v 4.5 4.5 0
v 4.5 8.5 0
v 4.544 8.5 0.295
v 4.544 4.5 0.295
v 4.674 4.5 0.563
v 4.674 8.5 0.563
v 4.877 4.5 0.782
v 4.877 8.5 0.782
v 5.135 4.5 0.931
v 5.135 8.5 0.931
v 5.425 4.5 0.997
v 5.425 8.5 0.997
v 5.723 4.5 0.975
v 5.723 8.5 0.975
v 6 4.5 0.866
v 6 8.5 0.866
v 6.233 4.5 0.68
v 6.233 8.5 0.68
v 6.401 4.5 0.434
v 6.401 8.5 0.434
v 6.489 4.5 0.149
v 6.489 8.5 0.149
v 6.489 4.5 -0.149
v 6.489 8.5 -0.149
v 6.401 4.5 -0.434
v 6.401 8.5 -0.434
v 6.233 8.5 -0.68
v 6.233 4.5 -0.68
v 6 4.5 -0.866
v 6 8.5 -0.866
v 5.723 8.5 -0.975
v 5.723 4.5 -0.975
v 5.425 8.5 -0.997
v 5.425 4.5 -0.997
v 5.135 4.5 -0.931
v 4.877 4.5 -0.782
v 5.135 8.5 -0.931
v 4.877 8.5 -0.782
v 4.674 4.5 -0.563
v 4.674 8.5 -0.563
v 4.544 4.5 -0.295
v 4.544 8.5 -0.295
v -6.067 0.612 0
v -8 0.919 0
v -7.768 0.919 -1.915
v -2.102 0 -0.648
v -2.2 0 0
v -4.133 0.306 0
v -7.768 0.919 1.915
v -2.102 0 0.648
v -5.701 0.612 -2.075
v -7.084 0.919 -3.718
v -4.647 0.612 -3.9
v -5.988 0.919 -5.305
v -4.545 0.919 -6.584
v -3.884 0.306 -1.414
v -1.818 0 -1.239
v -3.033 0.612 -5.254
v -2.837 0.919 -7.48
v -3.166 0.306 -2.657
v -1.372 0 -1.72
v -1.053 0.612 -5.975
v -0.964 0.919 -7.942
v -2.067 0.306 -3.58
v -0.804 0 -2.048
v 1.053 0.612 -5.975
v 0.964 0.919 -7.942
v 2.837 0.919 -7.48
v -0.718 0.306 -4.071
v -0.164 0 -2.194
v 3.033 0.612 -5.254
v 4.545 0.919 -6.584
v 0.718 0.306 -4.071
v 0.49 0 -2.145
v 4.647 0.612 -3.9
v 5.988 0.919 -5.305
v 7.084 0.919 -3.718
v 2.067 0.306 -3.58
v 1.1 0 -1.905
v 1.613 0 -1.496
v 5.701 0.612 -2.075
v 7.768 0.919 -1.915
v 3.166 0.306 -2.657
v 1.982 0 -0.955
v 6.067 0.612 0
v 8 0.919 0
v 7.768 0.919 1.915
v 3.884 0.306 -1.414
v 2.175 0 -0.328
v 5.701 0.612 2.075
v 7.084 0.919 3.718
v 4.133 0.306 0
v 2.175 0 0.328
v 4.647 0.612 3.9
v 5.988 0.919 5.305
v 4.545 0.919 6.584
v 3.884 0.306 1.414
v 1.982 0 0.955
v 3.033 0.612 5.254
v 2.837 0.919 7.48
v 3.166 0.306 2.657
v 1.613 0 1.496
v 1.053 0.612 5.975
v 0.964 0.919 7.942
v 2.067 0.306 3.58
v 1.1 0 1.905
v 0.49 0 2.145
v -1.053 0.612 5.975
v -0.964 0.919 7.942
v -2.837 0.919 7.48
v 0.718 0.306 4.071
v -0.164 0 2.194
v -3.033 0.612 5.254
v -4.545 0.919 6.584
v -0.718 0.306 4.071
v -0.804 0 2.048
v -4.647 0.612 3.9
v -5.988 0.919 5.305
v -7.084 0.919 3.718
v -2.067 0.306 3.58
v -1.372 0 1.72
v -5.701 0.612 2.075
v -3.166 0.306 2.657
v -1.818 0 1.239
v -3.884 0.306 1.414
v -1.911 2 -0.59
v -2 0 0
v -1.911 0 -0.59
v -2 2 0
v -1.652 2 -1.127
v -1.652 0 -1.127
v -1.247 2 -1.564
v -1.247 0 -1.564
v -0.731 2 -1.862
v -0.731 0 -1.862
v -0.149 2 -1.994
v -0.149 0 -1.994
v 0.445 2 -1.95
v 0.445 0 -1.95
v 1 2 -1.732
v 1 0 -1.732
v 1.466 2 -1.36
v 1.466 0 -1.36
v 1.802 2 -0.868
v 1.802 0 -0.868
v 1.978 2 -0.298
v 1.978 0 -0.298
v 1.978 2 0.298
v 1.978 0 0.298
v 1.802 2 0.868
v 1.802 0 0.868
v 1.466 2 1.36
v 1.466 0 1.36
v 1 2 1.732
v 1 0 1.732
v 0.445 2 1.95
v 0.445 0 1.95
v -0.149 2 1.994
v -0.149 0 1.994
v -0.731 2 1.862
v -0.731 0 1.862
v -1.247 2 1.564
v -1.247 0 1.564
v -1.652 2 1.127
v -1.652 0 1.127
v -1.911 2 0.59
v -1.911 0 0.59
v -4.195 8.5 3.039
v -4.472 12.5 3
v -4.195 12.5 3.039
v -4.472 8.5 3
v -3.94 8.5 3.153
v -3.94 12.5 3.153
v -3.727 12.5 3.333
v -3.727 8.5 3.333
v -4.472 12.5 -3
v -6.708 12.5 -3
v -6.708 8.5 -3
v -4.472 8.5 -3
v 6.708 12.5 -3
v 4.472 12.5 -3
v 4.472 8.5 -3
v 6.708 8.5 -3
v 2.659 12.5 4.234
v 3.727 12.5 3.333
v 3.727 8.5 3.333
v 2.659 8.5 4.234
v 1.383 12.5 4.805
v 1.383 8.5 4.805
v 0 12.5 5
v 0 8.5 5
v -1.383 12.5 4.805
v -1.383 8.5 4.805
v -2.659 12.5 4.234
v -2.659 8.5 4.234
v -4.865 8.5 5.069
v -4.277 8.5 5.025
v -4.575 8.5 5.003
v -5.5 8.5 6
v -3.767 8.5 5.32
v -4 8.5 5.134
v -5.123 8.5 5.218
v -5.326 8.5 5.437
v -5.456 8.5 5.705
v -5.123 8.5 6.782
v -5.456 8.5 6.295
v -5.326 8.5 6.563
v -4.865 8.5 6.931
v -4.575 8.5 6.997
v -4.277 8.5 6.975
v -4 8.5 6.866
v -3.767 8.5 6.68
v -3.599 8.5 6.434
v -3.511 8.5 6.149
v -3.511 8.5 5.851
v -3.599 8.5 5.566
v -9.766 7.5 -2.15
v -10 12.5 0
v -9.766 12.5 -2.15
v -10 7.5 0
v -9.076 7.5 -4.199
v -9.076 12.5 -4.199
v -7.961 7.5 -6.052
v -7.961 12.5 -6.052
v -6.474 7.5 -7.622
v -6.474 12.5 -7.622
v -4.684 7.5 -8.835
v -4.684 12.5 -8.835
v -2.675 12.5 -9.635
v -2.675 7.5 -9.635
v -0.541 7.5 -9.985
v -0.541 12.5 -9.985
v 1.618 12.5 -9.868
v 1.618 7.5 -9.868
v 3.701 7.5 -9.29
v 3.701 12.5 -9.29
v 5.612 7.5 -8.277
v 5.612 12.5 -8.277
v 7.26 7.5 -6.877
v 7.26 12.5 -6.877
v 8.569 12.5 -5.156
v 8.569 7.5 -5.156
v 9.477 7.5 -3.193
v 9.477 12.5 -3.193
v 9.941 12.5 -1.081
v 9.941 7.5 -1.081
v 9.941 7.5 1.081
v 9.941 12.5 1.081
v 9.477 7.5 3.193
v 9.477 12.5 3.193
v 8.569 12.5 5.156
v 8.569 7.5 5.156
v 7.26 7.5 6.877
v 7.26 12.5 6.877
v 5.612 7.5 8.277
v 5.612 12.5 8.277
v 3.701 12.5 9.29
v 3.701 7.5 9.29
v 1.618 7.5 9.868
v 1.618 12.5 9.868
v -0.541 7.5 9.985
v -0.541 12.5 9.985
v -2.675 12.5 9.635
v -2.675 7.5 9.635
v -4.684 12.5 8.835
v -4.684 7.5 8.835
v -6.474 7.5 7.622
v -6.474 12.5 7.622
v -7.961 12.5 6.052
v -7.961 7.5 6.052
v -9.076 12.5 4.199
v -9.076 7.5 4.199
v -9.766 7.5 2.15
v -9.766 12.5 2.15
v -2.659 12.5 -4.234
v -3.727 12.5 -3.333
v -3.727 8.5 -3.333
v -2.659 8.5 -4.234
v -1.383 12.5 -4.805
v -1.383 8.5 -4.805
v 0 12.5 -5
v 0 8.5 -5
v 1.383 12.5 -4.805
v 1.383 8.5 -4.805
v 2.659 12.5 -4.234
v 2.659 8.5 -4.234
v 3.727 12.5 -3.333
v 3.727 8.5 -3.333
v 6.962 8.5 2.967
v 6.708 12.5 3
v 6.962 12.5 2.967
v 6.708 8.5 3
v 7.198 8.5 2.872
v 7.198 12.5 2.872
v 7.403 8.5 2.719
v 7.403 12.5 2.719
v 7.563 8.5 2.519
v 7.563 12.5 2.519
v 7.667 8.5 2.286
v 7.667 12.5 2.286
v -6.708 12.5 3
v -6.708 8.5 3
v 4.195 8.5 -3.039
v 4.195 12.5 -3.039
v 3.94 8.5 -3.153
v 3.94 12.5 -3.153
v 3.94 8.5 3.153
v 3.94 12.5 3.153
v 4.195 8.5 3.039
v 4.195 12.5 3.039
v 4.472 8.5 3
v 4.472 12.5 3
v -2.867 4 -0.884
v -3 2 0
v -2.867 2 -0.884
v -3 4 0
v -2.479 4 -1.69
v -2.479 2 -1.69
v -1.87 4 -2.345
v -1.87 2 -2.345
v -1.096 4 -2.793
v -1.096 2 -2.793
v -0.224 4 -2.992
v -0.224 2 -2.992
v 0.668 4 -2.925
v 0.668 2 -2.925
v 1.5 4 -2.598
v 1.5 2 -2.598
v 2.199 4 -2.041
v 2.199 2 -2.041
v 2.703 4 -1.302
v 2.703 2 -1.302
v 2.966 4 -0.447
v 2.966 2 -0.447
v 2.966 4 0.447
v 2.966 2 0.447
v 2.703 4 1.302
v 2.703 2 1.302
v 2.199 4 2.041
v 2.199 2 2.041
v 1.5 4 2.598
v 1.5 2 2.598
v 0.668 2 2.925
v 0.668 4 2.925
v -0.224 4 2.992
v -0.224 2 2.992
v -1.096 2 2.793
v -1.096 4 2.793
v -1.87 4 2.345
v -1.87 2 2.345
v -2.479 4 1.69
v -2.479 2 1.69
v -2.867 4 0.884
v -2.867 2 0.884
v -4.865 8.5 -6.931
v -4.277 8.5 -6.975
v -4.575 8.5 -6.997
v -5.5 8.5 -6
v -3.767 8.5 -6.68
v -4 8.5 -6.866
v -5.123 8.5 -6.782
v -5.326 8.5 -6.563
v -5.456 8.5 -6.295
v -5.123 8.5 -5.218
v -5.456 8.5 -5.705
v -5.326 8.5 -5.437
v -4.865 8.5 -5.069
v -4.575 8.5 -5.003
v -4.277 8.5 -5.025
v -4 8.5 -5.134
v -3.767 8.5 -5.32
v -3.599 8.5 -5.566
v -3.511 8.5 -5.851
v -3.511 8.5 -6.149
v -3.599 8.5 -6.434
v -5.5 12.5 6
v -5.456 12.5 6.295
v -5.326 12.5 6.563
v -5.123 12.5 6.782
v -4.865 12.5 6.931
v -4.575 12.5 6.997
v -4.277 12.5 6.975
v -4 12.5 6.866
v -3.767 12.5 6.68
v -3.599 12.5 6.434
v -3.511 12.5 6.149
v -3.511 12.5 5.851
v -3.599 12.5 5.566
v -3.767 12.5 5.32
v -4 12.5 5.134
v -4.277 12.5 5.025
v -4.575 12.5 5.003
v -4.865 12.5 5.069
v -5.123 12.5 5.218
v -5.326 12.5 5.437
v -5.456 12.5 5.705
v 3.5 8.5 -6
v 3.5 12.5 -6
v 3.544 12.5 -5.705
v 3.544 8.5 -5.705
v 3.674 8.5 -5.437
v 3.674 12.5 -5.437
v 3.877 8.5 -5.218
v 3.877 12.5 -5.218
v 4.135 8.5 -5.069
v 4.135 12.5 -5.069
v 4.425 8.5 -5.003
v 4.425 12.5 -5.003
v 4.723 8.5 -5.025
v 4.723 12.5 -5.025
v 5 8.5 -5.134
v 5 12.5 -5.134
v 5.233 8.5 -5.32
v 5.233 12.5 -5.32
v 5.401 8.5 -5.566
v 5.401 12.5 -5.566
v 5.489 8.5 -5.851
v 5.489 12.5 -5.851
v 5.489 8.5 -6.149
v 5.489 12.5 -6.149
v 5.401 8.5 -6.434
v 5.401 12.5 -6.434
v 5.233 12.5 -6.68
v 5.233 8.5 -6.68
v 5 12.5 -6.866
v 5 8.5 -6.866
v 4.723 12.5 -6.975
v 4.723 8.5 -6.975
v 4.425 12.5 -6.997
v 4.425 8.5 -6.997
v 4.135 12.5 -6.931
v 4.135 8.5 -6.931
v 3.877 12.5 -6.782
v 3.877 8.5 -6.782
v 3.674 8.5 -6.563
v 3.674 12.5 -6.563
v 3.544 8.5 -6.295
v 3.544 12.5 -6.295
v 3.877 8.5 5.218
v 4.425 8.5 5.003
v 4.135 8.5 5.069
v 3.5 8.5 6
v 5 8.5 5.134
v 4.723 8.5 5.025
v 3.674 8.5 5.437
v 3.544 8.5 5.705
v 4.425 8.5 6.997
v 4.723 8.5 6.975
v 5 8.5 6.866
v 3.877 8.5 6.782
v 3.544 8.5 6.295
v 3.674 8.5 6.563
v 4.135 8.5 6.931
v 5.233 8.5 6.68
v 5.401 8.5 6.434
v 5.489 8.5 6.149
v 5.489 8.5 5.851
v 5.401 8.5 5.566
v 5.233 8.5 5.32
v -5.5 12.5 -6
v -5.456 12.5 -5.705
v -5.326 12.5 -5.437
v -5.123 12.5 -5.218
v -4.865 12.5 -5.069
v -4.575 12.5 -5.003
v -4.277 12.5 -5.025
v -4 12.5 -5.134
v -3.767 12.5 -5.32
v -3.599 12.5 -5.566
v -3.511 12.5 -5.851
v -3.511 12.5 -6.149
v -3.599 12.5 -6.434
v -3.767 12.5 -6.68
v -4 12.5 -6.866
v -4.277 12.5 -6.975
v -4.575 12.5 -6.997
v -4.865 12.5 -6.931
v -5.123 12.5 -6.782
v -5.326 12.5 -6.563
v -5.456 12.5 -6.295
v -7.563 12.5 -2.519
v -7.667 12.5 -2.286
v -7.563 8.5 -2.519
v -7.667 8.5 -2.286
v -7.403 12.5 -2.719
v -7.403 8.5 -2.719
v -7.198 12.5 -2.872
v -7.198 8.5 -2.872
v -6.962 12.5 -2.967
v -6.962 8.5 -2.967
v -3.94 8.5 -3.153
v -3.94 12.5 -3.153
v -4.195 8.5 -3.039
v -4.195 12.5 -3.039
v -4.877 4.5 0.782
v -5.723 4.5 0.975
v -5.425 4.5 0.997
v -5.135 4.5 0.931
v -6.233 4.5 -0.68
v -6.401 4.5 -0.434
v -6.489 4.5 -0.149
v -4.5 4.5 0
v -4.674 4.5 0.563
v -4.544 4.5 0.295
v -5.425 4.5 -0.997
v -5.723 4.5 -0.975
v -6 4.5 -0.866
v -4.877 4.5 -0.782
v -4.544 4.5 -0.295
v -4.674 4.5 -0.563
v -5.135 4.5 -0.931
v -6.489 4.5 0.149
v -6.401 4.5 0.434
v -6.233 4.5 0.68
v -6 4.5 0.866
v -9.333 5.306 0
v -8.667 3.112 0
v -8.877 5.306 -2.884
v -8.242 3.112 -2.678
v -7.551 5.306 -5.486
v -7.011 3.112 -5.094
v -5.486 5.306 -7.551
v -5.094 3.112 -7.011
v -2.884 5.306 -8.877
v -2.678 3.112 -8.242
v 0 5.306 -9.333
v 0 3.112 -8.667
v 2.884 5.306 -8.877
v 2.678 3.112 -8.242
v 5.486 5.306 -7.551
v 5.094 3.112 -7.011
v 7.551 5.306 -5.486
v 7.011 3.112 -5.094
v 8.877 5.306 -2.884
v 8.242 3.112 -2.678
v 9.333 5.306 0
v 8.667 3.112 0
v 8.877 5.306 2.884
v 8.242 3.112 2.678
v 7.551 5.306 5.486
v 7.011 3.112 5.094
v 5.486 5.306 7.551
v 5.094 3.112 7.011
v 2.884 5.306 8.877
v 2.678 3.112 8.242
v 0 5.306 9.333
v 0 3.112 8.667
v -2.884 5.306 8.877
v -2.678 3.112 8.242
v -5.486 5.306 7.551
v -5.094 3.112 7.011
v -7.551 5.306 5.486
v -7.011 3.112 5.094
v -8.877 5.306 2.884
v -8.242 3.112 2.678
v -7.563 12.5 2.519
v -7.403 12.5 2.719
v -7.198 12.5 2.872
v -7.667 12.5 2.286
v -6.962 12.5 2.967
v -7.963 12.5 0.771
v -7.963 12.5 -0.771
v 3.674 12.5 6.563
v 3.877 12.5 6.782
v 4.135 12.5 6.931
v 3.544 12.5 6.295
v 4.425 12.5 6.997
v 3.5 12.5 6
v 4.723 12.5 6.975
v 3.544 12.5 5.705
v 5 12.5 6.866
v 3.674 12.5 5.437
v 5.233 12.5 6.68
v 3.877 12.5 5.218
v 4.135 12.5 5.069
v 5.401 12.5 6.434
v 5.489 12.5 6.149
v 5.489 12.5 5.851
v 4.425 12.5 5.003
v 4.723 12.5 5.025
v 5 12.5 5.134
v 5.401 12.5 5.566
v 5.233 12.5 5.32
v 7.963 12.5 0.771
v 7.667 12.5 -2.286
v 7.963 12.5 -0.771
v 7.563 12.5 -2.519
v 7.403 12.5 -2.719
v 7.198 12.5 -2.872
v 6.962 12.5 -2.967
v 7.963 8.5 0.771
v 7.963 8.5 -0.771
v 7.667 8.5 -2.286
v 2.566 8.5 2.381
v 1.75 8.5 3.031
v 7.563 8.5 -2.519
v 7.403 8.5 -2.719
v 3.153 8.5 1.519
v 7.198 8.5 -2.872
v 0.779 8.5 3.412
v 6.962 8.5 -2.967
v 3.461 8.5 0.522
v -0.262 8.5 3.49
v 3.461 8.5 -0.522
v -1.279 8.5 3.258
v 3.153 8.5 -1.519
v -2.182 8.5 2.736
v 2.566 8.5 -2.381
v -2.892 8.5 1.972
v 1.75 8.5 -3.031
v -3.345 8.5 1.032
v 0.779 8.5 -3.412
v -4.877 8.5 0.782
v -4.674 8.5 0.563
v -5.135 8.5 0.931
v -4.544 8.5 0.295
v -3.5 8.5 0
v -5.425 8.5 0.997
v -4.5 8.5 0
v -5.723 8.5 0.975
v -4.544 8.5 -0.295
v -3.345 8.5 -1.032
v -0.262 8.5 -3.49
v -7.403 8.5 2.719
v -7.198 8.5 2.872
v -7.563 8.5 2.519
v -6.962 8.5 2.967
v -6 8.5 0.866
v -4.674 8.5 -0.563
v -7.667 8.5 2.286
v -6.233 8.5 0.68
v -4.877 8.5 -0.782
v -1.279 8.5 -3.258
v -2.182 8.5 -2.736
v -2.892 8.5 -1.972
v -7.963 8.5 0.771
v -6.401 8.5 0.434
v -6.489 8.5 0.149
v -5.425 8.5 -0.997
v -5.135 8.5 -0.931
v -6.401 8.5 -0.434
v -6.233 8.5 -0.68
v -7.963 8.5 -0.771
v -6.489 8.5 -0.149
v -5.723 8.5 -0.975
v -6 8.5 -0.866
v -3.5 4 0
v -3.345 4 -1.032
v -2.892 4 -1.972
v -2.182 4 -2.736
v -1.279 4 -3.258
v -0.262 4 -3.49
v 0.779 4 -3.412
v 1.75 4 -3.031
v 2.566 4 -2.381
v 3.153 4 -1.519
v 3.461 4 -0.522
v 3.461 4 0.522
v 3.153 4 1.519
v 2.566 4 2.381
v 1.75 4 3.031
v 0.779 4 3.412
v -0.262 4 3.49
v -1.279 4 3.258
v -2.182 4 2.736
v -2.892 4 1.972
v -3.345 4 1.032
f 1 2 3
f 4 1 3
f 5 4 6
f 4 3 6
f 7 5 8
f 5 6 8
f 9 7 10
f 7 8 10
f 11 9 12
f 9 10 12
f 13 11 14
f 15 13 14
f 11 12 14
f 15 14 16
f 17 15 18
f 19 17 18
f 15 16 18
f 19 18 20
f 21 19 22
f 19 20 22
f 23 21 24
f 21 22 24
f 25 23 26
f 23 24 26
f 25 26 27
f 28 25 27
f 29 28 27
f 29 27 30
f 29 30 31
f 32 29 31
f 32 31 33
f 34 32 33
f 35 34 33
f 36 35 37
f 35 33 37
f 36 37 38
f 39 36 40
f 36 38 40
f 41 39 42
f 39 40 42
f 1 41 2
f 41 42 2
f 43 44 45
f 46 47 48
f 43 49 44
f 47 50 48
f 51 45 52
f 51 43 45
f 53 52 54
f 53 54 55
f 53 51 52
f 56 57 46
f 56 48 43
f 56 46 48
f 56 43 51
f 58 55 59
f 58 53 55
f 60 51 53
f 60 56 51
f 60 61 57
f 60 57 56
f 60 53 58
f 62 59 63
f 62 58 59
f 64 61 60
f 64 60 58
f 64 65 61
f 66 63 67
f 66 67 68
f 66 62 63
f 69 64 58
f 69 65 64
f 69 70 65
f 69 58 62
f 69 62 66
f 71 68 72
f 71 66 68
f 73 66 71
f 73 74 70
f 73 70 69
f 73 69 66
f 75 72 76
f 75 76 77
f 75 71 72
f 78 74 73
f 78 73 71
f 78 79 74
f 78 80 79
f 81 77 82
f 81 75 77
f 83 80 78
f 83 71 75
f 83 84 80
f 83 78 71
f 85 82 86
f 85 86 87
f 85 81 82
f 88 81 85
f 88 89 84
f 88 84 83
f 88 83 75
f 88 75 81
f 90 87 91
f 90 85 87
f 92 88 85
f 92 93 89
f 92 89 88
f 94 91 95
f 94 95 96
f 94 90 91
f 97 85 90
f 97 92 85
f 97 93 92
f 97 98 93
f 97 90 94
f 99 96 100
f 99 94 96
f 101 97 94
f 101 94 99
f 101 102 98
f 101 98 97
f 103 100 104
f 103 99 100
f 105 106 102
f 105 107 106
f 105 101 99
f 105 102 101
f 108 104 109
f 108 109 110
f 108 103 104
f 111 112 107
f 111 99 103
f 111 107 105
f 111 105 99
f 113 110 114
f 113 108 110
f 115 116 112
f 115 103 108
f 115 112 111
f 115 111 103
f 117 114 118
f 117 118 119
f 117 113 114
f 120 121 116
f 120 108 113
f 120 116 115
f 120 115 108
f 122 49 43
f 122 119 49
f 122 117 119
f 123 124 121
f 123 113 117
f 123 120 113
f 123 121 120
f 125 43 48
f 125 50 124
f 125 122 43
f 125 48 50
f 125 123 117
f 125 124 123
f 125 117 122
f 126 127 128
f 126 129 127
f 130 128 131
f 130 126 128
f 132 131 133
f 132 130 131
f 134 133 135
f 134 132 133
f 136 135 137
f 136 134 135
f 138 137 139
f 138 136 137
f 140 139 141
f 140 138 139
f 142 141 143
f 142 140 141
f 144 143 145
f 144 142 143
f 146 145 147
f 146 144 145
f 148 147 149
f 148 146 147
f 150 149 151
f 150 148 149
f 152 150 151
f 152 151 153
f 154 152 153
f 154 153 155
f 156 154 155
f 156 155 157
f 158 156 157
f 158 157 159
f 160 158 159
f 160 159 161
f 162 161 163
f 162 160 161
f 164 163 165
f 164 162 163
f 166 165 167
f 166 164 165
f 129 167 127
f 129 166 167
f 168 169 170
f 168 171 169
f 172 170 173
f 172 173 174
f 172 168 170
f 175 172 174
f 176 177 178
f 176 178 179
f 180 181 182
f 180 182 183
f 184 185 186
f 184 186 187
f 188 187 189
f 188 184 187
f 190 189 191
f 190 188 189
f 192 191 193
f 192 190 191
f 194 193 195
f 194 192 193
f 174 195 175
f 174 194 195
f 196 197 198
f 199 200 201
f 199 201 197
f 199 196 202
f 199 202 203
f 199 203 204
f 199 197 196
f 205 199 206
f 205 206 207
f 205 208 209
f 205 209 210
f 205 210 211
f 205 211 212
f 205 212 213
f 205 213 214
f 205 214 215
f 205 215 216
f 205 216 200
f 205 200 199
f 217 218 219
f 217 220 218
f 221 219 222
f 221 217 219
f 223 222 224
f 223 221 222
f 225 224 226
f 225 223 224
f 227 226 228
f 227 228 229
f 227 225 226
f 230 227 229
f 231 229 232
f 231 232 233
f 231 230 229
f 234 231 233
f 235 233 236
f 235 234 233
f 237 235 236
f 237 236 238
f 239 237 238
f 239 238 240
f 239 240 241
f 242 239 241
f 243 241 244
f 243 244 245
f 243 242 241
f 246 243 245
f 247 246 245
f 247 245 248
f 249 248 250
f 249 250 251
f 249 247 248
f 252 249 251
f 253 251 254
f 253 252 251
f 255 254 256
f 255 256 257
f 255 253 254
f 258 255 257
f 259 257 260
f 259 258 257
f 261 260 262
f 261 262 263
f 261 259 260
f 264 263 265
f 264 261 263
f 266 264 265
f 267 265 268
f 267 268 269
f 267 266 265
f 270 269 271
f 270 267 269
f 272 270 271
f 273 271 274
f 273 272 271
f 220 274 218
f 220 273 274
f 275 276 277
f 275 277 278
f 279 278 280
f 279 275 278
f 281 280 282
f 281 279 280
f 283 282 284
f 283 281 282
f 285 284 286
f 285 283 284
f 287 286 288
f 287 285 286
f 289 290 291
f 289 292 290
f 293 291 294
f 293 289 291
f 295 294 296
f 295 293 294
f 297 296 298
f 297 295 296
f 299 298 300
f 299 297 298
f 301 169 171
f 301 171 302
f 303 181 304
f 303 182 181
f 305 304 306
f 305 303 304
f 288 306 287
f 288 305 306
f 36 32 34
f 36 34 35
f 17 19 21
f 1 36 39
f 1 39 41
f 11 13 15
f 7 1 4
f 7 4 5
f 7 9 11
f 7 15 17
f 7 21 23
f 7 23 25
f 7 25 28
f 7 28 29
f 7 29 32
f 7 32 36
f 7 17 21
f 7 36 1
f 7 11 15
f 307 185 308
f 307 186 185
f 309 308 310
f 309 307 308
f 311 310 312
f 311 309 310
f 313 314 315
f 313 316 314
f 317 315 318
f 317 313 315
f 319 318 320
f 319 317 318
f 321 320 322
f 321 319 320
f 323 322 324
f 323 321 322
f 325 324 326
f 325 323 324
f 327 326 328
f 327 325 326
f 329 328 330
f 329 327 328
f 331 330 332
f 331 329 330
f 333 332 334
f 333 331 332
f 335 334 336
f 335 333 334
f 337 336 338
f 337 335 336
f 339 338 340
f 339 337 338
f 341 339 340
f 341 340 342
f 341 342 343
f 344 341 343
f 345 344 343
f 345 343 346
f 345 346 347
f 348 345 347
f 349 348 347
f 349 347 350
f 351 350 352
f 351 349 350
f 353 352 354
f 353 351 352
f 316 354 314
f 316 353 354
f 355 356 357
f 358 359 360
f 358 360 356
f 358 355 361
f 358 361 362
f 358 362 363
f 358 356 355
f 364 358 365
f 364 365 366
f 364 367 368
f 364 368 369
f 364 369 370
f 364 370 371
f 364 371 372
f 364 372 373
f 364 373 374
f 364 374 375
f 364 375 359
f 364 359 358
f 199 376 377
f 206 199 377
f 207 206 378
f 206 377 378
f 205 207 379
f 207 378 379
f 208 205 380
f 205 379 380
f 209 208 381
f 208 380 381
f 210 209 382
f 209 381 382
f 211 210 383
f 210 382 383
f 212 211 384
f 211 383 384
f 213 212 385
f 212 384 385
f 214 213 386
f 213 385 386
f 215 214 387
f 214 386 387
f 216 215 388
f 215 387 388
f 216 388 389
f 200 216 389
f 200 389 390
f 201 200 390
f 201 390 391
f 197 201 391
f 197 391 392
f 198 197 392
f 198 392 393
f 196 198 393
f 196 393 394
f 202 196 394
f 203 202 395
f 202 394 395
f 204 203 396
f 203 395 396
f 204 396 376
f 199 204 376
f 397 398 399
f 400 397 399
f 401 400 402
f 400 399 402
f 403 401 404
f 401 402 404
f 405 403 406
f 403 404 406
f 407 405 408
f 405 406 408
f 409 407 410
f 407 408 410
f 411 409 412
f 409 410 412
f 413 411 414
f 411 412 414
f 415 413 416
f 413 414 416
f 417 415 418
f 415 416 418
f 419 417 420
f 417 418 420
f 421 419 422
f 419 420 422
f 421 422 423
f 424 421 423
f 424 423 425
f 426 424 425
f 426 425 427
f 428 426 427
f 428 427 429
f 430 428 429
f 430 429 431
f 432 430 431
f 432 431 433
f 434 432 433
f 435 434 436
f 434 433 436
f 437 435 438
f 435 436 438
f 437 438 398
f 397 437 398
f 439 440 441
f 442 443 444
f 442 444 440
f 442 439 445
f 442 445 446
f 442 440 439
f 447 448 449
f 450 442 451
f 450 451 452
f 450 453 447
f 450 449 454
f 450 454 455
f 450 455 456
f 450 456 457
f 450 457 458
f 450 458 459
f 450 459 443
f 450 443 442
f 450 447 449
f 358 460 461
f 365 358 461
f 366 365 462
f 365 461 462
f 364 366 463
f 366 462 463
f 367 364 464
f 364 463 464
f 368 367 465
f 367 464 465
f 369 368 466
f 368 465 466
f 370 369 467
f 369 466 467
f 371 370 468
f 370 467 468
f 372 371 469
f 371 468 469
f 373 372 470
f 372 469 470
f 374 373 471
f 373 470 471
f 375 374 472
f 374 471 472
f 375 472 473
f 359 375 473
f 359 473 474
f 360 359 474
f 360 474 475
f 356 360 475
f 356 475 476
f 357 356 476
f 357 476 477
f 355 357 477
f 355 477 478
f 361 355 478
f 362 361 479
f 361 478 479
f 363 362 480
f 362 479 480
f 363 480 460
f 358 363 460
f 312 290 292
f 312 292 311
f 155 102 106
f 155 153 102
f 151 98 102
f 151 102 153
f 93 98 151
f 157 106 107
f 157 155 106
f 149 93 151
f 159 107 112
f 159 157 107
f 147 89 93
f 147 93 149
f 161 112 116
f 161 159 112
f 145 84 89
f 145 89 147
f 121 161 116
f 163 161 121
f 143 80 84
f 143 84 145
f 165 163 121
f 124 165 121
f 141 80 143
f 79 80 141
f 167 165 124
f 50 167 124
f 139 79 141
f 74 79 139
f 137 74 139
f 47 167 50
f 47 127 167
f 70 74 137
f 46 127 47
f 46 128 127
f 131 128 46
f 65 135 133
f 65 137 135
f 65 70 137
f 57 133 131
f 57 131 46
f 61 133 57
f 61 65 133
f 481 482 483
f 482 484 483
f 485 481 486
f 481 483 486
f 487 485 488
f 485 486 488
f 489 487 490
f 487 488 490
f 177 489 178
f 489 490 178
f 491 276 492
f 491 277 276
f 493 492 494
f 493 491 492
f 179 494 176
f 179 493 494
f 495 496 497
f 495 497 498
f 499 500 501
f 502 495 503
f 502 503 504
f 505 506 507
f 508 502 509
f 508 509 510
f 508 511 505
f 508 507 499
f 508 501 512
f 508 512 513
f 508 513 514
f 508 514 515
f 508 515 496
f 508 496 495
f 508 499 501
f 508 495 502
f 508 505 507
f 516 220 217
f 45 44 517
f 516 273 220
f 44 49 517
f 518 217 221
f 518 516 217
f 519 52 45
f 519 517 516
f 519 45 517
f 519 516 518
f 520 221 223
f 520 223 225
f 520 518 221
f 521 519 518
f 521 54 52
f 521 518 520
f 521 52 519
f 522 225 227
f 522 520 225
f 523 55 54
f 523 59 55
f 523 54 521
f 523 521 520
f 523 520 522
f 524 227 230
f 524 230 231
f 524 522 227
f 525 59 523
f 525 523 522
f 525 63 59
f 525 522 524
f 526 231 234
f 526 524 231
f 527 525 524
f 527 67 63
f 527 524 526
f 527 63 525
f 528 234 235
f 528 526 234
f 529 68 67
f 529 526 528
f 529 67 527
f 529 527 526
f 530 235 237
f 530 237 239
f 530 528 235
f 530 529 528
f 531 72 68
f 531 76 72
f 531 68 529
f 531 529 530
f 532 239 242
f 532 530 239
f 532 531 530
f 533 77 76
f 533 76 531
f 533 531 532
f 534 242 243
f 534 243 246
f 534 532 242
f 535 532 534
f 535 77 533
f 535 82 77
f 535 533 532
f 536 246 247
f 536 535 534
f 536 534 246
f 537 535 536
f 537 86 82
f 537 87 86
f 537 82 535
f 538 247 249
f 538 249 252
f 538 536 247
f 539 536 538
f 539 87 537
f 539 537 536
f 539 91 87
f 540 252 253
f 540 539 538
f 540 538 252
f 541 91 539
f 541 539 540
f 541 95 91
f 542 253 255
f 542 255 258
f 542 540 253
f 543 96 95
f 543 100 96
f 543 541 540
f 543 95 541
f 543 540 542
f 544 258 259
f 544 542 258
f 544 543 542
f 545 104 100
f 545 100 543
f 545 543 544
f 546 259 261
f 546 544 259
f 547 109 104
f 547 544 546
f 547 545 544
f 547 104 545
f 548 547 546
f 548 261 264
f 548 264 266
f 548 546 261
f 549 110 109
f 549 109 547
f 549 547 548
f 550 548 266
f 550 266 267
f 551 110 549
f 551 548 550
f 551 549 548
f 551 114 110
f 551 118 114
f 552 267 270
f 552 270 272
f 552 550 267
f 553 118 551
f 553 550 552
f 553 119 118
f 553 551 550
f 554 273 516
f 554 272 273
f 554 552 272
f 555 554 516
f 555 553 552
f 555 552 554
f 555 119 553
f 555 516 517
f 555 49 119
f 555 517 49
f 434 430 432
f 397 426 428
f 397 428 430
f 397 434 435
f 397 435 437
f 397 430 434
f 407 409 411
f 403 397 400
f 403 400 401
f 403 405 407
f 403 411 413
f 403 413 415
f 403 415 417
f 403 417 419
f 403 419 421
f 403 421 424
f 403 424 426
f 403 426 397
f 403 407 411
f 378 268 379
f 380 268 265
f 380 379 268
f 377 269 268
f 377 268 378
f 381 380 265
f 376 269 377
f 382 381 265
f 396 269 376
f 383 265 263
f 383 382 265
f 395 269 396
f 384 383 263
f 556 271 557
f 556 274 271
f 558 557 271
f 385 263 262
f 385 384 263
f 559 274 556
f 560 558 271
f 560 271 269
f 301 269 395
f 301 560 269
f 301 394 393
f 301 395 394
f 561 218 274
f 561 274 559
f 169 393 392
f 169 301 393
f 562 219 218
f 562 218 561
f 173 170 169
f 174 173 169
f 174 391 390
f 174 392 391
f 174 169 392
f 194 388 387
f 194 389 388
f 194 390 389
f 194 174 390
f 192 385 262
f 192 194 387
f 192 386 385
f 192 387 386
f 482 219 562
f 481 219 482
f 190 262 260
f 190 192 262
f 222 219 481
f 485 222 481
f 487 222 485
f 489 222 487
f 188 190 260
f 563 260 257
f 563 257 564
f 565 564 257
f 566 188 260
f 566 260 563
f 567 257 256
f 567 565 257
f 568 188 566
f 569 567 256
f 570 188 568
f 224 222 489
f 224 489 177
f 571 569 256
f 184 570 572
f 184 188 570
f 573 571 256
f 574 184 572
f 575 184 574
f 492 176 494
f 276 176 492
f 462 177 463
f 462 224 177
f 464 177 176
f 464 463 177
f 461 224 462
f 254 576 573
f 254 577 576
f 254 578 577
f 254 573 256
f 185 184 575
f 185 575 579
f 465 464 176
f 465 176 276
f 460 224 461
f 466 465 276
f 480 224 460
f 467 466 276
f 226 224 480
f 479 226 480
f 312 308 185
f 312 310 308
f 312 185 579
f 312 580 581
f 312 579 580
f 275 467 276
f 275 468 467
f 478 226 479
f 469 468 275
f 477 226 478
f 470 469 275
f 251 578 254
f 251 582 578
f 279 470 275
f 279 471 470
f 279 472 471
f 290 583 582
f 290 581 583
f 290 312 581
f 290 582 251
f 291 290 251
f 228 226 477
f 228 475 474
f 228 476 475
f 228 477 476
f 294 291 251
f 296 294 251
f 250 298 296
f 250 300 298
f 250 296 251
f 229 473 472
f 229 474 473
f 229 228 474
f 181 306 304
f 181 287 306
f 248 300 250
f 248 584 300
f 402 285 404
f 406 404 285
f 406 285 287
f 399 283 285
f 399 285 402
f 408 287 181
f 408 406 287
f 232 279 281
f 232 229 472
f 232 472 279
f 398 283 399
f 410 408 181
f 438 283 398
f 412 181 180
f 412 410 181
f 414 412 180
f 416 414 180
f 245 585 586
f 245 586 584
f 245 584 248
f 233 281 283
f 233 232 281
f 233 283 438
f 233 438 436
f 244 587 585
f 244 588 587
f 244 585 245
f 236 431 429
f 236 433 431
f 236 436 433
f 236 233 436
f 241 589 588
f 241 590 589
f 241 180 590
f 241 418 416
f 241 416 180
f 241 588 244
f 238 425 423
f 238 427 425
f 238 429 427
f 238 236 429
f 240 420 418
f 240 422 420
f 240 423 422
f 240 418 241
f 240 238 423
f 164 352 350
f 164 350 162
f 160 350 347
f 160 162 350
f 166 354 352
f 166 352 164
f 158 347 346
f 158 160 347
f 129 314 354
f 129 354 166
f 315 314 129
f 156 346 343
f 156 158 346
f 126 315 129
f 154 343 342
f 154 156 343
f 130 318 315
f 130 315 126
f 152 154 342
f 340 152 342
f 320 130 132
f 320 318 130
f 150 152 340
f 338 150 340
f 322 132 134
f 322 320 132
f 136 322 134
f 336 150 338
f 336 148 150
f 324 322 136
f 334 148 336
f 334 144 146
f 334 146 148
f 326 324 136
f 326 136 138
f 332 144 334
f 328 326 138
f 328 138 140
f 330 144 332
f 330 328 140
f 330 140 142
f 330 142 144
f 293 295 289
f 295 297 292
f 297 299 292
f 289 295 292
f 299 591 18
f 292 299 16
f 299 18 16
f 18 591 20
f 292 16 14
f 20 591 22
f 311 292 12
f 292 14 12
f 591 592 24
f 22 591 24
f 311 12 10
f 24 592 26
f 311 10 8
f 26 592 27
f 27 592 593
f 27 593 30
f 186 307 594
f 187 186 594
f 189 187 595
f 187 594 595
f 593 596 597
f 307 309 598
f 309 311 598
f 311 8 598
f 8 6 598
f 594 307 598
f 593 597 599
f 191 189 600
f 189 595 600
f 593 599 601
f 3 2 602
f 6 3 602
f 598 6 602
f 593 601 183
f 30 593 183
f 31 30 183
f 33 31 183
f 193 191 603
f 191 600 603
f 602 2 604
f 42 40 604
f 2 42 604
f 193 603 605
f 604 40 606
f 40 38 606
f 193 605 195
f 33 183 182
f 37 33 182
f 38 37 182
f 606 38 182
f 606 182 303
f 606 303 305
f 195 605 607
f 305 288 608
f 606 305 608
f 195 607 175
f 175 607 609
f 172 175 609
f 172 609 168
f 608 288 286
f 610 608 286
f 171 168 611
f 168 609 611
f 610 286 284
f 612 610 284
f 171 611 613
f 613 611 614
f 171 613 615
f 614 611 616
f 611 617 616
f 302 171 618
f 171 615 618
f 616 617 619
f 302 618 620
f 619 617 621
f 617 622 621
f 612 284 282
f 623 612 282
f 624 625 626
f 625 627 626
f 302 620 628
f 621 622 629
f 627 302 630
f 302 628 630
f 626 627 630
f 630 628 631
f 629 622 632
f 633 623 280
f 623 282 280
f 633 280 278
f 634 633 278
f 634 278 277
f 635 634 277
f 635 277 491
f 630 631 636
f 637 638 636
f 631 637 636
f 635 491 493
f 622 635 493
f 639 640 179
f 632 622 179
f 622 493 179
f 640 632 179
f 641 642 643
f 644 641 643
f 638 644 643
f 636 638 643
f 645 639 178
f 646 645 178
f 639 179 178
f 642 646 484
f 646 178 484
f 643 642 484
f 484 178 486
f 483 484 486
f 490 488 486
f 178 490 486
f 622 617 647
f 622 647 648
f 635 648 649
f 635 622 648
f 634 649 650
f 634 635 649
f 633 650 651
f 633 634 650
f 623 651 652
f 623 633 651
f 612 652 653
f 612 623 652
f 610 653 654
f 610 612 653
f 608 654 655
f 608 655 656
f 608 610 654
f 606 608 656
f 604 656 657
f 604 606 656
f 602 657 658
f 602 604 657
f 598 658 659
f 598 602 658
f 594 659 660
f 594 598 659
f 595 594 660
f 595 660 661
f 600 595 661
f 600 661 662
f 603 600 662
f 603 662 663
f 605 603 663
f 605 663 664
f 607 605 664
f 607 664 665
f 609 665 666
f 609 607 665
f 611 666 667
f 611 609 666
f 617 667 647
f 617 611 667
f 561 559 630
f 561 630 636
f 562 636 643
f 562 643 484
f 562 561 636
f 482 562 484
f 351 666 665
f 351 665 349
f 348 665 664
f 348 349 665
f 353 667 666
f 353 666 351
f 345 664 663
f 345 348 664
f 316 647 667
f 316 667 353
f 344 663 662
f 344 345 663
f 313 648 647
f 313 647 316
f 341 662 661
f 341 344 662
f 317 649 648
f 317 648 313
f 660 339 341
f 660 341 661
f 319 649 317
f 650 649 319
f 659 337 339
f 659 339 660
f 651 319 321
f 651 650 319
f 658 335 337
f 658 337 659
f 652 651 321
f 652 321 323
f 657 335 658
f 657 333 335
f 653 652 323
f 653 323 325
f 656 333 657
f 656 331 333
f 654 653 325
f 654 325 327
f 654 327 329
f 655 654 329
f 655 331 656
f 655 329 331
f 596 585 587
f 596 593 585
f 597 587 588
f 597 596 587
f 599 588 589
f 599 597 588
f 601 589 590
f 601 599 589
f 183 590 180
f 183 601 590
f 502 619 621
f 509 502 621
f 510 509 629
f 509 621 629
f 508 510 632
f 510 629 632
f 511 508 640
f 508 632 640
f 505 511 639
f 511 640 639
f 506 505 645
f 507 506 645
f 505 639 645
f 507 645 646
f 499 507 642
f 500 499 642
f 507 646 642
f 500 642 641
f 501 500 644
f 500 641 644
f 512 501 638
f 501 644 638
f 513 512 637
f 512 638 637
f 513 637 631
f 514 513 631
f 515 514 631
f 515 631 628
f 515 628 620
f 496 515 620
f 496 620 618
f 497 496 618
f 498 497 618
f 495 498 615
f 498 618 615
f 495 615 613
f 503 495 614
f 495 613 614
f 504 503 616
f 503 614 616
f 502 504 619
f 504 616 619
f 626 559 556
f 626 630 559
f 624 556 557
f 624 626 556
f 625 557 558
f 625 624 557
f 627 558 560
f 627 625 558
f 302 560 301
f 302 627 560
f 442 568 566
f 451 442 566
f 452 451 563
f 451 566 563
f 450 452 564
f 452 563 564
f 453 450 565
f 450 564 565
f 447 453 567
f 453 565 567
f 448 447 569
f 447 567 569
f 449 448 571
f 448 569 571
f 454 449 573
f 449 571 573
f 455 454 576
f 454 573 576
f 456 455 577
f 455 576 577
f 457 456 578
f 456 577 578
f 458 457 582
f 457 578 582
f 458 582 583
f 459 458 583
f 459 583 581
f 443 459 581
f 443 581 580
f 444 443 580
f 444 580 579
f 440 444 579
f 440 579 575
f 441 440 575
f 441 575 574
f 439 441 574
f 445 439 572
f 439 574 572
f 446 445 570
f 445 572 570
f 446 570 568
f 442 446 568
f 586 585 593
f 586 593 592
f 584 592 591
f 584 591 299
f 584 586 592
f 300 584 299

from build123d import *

# Parameters (mm, degrees)
CUT_EXTRUDE_1_DEPTH = 4
FILLET_1_R          = 1
SKETCH_3_R          = 1
CUT_EXTRUDE_2_DEPTH = 4
SKETCH_4_R          = 1
CUT_EXTRUDE_3_DEPTH = 4


with BuildPart() as part:
    # 草图1 → 旋转1 (revolve)
    with BuildSketch(Plane.XY, mode=Mode.PRIVATE) as revolve_1_sk:
        Polygon((2, 0), (2, 2), (3, 2), (3, 4), (3.5, 4), (3.5, 12.5), (10, 12.5), (10, 7.5), (8, 0.918629754), (2.2, 0), align=None)
    revolve(revolve_1_sk.sketch.rotate(Axis((0, 0.286130796, 0), (0, -1, 0)), 180), axis=Axis((0, 0.286130796, 0), (0, -1, 0)))

    # 草图2 → 切除-拉伸1 (cut)
    with BuildSketch(Plane(origin=(0, 12.5, 0), x_dir=(1, 0, 0), z_dir=(0, 1, 0))):
        with BuildLine():
            Line((-7.416198487, 3), (-4, 3))
            ThreePointArc((-4, 3), (0, 5), (4, 3))
            Line((4, 3), (7.416198487, 3))
            ThreePointArc((7.416198487, 3), (8, 0), (7.416198487, -3))
            Line((7.416198487, -3), (4, -3))
            ThreePointArc((4, -3), (0, -5), (-4, -3))
            Line((-4, -3), (-7.416198487, -3))
            ThreePointArc((-7.416198487, -3), (-8, 0), (-7.416198487, 3))
        make_face()
    extrude(amount=-CUT_EXTRUDE_1_DEPTH, mode=Mode.SUBTRACT)

    # 圆角1
    fillet_1_edges = [part.edges().sort_by_distance(p)[0] for p in [
        (-7.416198487, 10.5, 3),
        (-7.416198487, 10.5, -3),
        (-4, 10.5, -3),
        (4, 10.5, -3),
        (7.416198487, 10.5, -3),
        (7.416198487, 10.5, 3),
        (4, 10.5, 3),
        (-4, 10.5, 3),
    ]]
    fillet(fillet_1_edges, radius=FILLET_1_R)

    # 草图3 → 切除-拉伸2 (cut)
    with BuildSketch(Plane(origin=(0, 8.5, 0), x_dir=(1, 0, 0), z_dir=(0, 1, 0))):
        with Locations(Location((5.5, 0, 0), (0, 0, 180))):
            Circle(SKETCH_3_R)
        with Locations((-5.5, 0)):
            Circle(SKETCH_3_R)
    extrude(amount=-CUT_EXTRUDE_2_DEPTH, mode=Mode.SUBTRACT)

    # 草图4 → 切除-拉伸3 (cut)
    with BuildSketch(Plane(origin=(0, 12.5, 0), x_dir=(1, 0, 0), z_dir=(0, 1, 0))):
        with Locations(Location((-4.5, 6, 0), (0, 0, 180))):
            Circle(SKETCH_4_R)
        with Locations(Location((4.5, 6, 0), (0, 0, 180))):
            Circle(SKETCH_4_R)
        with Locations(Location((-4.5, -6, 0), (0, 0, 180))):
            Circle(SKETCH_4_R)
        with Locations(Location((4.5, -6, 0), (0, 0, 180))):
            Circle(SKETCH_4_R)
    extrude(amount=-CUT_EXTRUDE_3_DEPTH, mode=Mode.SUBTRACT)


solid = part.part
